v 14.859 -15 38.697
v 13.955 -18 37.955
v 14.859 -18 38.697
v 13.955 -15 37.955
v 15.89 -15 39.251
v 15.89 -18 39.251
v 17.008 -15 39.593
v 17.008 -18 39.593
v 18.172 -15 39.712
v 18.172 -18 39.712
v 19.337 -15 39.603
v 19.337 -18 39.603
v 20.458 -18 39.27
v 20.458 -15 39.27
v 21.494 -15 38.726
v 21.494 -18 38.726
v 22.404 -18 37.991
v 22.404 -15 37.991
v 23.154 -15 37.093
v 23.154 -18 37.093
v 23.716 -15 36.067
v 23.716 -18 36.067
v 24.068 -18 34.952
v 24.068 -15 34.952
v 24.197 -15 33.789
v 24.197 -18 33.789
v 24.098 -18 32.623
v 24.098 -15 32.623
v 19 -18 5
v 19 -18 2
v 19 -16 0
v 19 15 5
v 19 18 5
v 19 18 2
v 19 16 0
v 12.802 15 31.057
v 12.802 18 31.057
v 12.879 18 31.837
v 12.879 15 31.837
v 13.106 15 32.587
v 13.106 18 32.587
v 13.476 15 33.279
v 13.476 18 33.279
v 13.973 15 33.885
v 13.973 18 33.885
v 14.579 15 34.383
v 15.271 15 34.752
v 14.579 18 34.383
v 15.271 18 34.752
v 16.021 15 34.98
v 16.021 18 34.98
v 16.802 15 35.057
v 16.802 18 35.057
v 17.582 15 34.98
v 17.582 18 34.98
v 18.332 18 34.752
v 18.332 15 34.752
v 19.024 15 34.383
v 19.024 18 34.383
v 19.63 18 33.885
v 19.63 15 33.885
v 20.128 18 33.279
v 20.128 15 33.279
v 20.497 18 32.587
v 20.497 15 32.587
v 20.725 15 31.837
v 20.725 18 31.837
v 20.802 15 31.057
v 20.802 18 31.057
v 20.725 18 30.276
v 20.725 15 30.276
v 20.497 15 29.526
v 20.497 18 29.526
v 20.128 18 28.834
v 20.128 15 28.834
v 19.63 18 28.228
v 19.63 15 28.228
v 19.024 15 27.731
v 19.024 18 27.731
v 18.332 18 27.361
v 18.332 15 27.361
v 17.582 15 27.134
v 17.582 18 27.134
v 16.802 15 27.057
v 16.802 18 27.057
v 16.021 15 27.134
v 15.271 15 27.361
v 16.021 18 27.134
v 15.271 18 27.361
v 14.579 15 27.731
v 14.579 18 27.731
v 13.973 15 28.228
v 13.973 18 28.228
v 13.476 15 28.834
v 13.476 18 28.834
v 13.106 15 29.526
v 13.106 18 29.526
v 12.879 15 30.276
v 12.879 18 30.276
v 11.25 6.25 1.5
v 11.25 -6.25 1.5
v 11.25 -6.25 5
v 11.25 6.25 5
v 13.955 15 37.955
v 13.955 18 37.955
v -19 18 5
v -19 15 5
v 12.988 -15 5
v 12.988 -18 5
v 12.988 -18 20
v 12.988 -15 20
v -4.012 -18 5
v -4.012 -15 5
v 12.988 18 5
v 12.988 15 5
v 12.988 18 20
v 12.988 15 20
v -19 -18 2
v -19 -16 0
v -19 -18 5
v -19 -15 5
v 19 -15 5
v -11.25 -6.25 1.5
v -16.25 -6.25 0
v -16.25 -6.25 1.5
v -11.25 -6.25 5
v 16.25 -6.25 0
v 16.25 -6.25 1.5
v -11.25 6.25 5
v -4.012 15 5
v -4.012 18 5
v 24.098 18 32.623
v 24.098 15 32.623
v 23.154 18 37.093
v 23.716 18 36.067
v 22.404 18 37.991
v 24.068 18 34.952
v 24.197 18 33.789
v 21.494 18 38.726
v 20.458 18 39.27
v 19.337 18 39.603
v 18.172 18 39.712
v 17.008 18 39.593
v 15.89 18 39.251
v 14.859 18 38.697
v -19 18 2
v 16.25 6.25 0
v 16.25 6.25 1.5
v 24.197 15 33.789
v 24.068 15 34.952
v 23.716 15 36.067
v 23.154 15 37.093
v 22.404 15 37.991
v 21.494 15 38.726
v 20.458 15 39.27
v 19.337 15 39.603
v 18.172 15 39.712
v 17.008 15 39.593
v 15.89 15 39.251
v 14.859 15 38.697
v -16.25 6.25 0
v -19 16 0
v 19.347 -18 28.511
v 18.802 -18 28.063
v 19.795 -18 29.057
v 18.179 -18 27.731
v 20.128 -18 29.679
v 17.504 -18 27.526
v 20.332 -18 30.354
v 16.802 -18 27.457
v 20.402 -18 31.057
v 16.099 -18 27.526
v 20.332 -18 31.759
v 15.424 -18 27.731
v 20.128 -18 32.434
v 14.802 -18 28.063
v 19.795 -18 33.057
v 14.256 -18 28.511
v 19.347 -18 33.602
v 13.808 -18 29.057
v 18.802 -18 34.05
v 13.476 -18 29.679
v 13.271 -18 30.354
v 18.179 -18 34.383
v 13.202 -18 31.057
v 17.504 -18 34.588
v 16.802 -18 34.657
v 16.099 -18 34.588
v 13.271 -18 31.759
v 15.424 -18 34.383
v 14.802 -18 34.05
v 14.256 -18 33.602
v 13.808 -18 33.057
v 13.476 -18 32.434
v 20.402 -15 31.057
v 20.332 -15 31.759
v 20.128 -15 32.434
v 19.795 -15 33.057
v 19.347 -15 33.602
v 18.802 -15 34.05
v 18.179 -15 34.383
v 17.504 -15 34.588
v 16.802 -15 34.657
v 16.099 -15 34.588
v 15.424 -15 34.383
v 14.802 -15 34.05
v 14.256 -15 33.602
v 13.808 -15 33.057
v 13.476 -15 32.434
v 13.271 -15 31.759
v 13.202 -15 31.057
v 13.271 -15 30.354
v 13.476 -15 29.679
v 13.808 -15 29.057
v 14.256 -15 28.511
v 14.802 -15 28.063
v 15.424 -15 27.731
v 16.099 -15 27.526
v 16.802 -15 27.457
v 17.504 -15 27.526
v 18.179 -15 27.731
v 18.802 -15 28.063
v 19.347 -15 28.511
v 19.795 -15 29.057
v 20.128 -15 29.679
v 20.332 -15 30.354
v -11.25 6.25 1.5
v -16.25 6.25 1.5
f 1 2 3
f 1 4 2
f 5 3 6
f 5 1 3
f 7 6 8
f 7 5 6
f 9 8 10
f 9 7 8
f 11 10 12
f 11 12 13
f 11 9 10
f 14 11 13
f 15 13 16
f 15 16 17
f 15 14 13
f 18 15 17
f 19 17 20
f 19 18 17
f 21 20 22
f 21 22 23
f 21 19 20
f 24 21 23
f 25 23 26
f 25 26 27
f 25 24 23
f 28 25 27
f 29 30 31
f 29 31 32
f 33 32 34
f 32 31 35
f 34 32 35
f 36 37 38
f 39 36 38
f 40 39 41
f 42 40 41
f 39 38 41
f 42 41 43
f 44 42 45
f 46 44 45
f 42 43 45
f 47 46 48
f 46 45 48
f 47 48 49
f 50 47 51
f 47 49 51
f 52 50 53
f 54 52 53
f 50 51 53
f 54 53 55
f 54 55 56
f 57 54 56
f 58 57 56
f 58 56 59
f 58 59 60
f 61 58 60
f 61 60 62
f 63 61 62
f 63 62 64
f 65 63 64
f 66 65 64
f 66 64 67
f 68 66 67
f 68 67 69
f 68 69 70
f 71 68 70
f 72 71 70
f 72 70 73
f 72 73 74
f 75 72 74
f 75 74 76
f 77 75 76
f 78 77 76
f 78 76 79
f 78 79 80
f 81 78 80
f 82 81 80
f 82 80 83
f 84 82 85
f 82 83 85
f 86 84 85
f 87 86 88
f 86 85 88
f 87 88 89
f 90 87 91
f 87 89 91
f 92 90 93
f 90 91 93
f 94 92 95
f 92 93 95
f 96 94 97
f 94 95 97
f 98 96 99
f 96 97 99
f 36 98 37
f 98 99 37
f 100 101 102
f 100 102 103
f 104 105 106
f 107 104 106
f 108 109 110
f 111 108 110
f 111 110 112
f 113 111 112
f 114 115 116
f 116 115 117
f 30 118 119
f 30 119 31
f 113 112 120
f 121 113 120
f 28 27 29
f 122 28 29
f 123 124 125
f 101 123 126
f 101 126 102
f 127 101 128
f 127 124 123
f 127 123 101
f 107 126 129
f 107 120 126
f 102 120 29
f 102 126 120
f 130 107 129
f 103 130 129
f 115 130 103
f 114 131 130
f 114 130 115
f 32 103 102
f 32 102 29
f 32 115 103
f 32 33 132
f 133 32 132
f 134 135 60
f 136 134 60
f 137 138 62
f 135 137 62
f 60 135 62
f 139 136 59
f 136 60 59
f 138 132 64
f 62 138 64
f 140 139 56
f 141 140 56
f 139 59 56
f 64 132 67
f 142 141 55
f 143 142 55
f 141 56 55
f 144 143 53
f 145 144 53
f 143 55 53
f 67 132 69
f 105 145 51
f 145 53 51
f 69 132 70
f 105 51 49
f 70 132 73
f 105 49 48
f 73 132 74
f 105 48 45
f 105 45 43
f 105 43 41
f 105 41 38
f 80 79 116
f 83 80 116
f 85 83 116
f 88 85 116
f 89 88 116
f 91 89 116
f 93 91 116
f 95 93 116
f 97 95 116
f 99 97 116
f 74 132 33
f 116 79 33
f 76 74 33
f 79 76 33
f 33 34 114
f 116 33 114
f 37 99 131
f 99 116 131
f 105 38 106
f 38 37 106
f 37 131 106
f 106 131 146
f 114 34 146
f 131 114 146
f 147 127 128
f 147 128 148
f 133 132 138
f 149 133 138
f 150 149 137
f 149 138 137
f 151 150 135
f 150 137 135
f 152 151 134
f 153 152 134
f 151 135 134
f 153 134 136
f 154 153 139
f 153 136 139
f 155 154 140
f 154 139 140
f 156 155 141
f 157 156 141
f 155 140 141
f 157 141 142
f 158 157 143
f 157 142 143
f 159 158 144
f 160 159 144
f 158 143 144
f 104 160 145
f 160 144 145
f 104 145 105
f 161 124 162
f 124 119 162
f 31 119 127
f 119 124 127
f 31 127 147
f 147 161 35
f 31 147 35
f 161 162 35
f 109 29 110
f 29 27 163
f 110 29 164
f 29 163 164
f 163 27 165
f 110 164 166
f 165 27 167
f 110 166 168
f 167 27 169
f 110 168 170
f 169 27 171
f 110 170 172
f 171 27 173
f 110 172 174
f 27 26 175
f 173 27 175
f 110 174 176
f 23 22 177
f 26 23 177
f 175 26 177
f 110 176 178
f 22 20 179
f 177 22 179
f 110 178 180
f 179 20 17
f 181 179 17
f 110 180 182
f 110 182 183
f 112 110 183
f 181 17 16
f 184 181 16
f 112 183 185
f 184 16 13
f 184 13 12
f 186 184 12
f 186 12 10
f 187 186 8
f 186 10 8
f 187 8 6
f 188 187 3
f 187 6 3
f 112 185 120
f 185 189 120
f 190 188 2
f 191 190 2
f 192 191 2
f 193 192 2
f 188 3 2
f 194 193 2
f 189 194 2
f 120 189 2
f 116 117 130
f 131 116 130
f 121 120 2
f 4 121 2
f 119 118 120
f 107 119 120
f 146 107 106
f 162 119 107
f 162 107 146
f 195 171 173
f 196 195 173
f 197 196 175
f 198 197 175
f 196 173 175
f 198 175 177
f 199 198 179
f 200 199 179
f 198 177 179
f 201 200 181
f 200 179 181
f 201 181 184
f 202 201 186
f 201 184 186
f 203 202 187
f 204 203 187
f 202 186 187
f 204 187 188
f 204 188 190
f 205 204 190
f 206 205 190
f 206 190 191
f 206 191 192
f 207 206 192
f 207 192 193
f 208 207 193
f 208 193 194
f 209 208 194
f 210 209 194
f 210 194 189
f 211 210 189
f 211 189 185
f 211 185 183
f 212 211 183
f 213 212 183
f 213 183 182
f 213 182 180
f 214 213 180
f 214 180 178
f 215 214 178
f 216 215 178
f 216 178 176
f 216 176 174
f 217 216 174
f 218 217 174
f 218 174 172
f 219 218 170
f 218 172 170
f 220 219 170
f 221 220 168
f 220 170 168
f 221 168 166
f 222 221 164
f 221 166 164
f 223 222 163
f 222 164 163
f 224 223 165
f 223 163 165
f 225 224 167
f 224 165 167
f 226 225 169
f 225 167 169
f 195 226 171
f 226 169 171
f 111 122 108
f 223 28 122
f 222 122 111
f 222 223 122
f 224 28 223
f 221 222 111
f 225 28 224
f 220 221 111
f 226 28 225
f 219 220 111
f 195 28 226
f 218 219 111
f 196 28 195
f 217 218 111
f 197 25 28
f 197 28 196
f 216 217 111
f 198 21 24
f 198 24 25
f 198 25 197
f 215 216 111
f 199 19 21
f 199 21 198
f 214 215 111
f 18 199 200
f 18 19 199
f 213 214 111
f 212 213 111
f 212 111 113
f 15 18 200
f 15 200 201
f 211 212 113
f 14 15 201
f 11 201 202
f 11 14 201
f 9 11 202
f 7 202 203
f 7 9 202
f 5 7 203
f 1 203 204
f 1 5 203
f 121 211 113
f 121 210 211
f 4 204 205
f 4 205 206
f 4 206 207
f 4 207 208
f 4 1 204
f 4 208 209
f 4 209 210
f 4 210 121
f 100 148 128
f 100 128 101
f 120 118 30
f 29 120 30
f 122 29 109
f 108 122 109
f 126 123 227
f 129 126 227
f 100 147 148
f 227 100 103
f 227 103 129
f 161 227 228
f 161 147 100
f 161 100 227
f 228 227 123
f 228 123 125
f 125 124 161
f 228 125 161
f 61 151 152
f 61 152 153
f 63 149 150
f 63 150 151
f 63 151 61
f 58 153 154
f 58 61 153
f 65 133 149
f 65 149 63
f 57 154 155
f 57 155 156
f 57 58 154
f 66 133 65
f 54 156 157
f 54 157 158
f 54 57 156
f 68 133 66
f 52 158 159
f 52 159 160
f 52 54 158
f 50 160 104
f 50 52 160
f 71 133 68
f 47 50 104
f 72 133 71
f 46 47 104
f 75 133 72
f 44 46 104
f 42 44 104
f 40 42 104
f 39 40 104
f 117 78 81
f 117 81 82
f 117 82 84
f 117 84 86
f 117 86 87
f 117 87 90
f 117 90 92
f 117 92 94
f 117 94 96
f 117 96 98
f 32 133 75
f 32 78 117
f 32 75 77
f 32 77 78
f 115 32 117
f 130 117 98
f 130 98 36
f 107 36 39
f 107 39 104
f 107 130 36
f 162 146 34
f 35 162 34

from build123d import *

# Parameters (mm, degrees)
CROQUIS1_W              = 38
CROQUIS1_H              = 36
CROQUIS1_W_2            = 22.5
CROQUIS1_H_2            = 12.5
SALIENTE_EXTRUIR1_DEPTH = 5
SALIENTE_EXTRUIR2_DEPTH = 3
REDONDEO1_R             = 6
SALIENTE_EXTRUIR3_DEPTH = 3
CROQUIS4_W              = 32.5
CROQUIS4_H              = 12.5
CORTAR_EXTRUIR1_DEPTH   = 1.5
CORTAR_EXTRUIR2_DEPTH   = 41.5
CHAFL_N1_SIZE           = 2
CROQUIS6_R              = 3.6
CORTAR_EXTRUIR4_DEPTH   = 10
CROQUIS7_R              = 4
CORTAR_EXTRUIR5_DEPTH   = 10


with BuildPart() as part:
    # Croquis1 → Saliente-Extruir1 (new body)
    with BuildSketch(Plane.XY):
        Rectangle(CROQUIS1_W, CROQUIS1_H)
        Rectangle(CROQUIS1_W_2, CROQUIS1_H_2, mode=Mode.SUBTRACT)
    extrude(amount=SALIENTE_EXTRUIR1_DEPTH)

    # Croquis3 → Saliente-Extruir3 (add)
    with BuildSketch(Plane(origin=(0, 18, 0), x_dir=(1, 0, 0), z_dir=(0, 1, 0))):
        with BuildLine():
            Line((-19, -5), (19, -5))
            Line((19, -5), (24.09786452, -32.623312397))
            ThreePointArc((24.09786452, -32.623312397), (20.989161561, -39.023212548), (13.954861208, -37.954861208))
            Line((13.954861208, -37.954861208), (-19, -5))
        make_face()
    extrude(amount=-SALIENTE_EXTRUIR3_DEPTH)

    # Croquis4 → Cortar-Extruir1 (cut)
    with BuildSketch(Plane(origin=(0, 0, 0), x_dir=(-1, 0, 0), z_dir=(0, 0, -1))):
        Rectangle(CROQUIS4_W, CROQUIS4_H)
    extrude(amount=-CORTAR_EXTRUIR1_DEPTH, mode=Mode.SUBTRACT)


with BuildPart() as body_2:
    # Croquis2 → Saliente-Extruir2 (new body)
    with BuildSketch(Plane.XZ.offset(18)):
        Polygon((-19, 5), (27.6, 51.6), (19, 5), align=None)
    extrude(amount=-SALIENTE_EXTRUIR2_DEPTH)

    # Redondeo1
    redondeo1_edges = [body_2.edges().sort_by_distance(p)[0] for p in [
        (27.6, -16.5, 51.6),
    ]]
    fillet(redondeo1_edges, radius=REDONDEO1_R)


with BuildPart() as cortar_extruir2_tool:
    # Croquis5 → Cortar-Extruir2 (new body)
    with BuildSketch(Plane.XZ.offset(18)):
        Polygon((-4.011879288, 5), (12.988120712, 5), (12.988120712, 20), align=None)
    extrude(amount=-CORTAR_EXTRUIR2_DEPTH)


with BuildPart() as part_1:
    add(part.part)

    # Cortar-Extruir2: cut by cortar_extruir2_tool
    add(cortar_extruir2_tool.part, mode=Mode.SUBTRACT)

    # Chaflán1
    chafl_n1_edges = [part_1.edges().sort_by_distance(p)[0] for p in [
        (0, 18, 0),
        (0, -18, 0),
    ]]
    chamfer(chafl_n1_edges, length=CHAFL_N1_SIZE)

    # Croquis7 → Cortar-Extruir5 (cut)
    with BuildSketch(Plane(origin=(0, 18, 0), x_dir=(1, 0, 0), z_dir=(0, 1, 0))):
        with Locations(Location((16.801672063, -31.056724508, 0), (0, 0, 180))):
            Circle(CROQUIS7_R)
    extrude(amount=-CORTAR_EXTRUIR5_DEPTH, mode=Mode.SUBTRACT)


with BuildPart() as body_2_1:
    add(body_2.part)

    # Cortar-Extruir2: cut by cortar_extruir2_tool
    add(cortar_extruir2_tool.part, mode=Mode.SUBTRACT)

    # Croquis6 → Cortar-Extruir4 (cut)
    with BuildSketch(Plane.XZ.offset(18)):
        with Locations((16.801672063, 31.056724508)):
            Circle(CROQUIS6_R)
    extrude(amount=-CORTAR_EXTRUIR4_DEPTH, mode=Mode.SUBTRACT)


solid = Compound([part_1.part, body_2_1.part])
